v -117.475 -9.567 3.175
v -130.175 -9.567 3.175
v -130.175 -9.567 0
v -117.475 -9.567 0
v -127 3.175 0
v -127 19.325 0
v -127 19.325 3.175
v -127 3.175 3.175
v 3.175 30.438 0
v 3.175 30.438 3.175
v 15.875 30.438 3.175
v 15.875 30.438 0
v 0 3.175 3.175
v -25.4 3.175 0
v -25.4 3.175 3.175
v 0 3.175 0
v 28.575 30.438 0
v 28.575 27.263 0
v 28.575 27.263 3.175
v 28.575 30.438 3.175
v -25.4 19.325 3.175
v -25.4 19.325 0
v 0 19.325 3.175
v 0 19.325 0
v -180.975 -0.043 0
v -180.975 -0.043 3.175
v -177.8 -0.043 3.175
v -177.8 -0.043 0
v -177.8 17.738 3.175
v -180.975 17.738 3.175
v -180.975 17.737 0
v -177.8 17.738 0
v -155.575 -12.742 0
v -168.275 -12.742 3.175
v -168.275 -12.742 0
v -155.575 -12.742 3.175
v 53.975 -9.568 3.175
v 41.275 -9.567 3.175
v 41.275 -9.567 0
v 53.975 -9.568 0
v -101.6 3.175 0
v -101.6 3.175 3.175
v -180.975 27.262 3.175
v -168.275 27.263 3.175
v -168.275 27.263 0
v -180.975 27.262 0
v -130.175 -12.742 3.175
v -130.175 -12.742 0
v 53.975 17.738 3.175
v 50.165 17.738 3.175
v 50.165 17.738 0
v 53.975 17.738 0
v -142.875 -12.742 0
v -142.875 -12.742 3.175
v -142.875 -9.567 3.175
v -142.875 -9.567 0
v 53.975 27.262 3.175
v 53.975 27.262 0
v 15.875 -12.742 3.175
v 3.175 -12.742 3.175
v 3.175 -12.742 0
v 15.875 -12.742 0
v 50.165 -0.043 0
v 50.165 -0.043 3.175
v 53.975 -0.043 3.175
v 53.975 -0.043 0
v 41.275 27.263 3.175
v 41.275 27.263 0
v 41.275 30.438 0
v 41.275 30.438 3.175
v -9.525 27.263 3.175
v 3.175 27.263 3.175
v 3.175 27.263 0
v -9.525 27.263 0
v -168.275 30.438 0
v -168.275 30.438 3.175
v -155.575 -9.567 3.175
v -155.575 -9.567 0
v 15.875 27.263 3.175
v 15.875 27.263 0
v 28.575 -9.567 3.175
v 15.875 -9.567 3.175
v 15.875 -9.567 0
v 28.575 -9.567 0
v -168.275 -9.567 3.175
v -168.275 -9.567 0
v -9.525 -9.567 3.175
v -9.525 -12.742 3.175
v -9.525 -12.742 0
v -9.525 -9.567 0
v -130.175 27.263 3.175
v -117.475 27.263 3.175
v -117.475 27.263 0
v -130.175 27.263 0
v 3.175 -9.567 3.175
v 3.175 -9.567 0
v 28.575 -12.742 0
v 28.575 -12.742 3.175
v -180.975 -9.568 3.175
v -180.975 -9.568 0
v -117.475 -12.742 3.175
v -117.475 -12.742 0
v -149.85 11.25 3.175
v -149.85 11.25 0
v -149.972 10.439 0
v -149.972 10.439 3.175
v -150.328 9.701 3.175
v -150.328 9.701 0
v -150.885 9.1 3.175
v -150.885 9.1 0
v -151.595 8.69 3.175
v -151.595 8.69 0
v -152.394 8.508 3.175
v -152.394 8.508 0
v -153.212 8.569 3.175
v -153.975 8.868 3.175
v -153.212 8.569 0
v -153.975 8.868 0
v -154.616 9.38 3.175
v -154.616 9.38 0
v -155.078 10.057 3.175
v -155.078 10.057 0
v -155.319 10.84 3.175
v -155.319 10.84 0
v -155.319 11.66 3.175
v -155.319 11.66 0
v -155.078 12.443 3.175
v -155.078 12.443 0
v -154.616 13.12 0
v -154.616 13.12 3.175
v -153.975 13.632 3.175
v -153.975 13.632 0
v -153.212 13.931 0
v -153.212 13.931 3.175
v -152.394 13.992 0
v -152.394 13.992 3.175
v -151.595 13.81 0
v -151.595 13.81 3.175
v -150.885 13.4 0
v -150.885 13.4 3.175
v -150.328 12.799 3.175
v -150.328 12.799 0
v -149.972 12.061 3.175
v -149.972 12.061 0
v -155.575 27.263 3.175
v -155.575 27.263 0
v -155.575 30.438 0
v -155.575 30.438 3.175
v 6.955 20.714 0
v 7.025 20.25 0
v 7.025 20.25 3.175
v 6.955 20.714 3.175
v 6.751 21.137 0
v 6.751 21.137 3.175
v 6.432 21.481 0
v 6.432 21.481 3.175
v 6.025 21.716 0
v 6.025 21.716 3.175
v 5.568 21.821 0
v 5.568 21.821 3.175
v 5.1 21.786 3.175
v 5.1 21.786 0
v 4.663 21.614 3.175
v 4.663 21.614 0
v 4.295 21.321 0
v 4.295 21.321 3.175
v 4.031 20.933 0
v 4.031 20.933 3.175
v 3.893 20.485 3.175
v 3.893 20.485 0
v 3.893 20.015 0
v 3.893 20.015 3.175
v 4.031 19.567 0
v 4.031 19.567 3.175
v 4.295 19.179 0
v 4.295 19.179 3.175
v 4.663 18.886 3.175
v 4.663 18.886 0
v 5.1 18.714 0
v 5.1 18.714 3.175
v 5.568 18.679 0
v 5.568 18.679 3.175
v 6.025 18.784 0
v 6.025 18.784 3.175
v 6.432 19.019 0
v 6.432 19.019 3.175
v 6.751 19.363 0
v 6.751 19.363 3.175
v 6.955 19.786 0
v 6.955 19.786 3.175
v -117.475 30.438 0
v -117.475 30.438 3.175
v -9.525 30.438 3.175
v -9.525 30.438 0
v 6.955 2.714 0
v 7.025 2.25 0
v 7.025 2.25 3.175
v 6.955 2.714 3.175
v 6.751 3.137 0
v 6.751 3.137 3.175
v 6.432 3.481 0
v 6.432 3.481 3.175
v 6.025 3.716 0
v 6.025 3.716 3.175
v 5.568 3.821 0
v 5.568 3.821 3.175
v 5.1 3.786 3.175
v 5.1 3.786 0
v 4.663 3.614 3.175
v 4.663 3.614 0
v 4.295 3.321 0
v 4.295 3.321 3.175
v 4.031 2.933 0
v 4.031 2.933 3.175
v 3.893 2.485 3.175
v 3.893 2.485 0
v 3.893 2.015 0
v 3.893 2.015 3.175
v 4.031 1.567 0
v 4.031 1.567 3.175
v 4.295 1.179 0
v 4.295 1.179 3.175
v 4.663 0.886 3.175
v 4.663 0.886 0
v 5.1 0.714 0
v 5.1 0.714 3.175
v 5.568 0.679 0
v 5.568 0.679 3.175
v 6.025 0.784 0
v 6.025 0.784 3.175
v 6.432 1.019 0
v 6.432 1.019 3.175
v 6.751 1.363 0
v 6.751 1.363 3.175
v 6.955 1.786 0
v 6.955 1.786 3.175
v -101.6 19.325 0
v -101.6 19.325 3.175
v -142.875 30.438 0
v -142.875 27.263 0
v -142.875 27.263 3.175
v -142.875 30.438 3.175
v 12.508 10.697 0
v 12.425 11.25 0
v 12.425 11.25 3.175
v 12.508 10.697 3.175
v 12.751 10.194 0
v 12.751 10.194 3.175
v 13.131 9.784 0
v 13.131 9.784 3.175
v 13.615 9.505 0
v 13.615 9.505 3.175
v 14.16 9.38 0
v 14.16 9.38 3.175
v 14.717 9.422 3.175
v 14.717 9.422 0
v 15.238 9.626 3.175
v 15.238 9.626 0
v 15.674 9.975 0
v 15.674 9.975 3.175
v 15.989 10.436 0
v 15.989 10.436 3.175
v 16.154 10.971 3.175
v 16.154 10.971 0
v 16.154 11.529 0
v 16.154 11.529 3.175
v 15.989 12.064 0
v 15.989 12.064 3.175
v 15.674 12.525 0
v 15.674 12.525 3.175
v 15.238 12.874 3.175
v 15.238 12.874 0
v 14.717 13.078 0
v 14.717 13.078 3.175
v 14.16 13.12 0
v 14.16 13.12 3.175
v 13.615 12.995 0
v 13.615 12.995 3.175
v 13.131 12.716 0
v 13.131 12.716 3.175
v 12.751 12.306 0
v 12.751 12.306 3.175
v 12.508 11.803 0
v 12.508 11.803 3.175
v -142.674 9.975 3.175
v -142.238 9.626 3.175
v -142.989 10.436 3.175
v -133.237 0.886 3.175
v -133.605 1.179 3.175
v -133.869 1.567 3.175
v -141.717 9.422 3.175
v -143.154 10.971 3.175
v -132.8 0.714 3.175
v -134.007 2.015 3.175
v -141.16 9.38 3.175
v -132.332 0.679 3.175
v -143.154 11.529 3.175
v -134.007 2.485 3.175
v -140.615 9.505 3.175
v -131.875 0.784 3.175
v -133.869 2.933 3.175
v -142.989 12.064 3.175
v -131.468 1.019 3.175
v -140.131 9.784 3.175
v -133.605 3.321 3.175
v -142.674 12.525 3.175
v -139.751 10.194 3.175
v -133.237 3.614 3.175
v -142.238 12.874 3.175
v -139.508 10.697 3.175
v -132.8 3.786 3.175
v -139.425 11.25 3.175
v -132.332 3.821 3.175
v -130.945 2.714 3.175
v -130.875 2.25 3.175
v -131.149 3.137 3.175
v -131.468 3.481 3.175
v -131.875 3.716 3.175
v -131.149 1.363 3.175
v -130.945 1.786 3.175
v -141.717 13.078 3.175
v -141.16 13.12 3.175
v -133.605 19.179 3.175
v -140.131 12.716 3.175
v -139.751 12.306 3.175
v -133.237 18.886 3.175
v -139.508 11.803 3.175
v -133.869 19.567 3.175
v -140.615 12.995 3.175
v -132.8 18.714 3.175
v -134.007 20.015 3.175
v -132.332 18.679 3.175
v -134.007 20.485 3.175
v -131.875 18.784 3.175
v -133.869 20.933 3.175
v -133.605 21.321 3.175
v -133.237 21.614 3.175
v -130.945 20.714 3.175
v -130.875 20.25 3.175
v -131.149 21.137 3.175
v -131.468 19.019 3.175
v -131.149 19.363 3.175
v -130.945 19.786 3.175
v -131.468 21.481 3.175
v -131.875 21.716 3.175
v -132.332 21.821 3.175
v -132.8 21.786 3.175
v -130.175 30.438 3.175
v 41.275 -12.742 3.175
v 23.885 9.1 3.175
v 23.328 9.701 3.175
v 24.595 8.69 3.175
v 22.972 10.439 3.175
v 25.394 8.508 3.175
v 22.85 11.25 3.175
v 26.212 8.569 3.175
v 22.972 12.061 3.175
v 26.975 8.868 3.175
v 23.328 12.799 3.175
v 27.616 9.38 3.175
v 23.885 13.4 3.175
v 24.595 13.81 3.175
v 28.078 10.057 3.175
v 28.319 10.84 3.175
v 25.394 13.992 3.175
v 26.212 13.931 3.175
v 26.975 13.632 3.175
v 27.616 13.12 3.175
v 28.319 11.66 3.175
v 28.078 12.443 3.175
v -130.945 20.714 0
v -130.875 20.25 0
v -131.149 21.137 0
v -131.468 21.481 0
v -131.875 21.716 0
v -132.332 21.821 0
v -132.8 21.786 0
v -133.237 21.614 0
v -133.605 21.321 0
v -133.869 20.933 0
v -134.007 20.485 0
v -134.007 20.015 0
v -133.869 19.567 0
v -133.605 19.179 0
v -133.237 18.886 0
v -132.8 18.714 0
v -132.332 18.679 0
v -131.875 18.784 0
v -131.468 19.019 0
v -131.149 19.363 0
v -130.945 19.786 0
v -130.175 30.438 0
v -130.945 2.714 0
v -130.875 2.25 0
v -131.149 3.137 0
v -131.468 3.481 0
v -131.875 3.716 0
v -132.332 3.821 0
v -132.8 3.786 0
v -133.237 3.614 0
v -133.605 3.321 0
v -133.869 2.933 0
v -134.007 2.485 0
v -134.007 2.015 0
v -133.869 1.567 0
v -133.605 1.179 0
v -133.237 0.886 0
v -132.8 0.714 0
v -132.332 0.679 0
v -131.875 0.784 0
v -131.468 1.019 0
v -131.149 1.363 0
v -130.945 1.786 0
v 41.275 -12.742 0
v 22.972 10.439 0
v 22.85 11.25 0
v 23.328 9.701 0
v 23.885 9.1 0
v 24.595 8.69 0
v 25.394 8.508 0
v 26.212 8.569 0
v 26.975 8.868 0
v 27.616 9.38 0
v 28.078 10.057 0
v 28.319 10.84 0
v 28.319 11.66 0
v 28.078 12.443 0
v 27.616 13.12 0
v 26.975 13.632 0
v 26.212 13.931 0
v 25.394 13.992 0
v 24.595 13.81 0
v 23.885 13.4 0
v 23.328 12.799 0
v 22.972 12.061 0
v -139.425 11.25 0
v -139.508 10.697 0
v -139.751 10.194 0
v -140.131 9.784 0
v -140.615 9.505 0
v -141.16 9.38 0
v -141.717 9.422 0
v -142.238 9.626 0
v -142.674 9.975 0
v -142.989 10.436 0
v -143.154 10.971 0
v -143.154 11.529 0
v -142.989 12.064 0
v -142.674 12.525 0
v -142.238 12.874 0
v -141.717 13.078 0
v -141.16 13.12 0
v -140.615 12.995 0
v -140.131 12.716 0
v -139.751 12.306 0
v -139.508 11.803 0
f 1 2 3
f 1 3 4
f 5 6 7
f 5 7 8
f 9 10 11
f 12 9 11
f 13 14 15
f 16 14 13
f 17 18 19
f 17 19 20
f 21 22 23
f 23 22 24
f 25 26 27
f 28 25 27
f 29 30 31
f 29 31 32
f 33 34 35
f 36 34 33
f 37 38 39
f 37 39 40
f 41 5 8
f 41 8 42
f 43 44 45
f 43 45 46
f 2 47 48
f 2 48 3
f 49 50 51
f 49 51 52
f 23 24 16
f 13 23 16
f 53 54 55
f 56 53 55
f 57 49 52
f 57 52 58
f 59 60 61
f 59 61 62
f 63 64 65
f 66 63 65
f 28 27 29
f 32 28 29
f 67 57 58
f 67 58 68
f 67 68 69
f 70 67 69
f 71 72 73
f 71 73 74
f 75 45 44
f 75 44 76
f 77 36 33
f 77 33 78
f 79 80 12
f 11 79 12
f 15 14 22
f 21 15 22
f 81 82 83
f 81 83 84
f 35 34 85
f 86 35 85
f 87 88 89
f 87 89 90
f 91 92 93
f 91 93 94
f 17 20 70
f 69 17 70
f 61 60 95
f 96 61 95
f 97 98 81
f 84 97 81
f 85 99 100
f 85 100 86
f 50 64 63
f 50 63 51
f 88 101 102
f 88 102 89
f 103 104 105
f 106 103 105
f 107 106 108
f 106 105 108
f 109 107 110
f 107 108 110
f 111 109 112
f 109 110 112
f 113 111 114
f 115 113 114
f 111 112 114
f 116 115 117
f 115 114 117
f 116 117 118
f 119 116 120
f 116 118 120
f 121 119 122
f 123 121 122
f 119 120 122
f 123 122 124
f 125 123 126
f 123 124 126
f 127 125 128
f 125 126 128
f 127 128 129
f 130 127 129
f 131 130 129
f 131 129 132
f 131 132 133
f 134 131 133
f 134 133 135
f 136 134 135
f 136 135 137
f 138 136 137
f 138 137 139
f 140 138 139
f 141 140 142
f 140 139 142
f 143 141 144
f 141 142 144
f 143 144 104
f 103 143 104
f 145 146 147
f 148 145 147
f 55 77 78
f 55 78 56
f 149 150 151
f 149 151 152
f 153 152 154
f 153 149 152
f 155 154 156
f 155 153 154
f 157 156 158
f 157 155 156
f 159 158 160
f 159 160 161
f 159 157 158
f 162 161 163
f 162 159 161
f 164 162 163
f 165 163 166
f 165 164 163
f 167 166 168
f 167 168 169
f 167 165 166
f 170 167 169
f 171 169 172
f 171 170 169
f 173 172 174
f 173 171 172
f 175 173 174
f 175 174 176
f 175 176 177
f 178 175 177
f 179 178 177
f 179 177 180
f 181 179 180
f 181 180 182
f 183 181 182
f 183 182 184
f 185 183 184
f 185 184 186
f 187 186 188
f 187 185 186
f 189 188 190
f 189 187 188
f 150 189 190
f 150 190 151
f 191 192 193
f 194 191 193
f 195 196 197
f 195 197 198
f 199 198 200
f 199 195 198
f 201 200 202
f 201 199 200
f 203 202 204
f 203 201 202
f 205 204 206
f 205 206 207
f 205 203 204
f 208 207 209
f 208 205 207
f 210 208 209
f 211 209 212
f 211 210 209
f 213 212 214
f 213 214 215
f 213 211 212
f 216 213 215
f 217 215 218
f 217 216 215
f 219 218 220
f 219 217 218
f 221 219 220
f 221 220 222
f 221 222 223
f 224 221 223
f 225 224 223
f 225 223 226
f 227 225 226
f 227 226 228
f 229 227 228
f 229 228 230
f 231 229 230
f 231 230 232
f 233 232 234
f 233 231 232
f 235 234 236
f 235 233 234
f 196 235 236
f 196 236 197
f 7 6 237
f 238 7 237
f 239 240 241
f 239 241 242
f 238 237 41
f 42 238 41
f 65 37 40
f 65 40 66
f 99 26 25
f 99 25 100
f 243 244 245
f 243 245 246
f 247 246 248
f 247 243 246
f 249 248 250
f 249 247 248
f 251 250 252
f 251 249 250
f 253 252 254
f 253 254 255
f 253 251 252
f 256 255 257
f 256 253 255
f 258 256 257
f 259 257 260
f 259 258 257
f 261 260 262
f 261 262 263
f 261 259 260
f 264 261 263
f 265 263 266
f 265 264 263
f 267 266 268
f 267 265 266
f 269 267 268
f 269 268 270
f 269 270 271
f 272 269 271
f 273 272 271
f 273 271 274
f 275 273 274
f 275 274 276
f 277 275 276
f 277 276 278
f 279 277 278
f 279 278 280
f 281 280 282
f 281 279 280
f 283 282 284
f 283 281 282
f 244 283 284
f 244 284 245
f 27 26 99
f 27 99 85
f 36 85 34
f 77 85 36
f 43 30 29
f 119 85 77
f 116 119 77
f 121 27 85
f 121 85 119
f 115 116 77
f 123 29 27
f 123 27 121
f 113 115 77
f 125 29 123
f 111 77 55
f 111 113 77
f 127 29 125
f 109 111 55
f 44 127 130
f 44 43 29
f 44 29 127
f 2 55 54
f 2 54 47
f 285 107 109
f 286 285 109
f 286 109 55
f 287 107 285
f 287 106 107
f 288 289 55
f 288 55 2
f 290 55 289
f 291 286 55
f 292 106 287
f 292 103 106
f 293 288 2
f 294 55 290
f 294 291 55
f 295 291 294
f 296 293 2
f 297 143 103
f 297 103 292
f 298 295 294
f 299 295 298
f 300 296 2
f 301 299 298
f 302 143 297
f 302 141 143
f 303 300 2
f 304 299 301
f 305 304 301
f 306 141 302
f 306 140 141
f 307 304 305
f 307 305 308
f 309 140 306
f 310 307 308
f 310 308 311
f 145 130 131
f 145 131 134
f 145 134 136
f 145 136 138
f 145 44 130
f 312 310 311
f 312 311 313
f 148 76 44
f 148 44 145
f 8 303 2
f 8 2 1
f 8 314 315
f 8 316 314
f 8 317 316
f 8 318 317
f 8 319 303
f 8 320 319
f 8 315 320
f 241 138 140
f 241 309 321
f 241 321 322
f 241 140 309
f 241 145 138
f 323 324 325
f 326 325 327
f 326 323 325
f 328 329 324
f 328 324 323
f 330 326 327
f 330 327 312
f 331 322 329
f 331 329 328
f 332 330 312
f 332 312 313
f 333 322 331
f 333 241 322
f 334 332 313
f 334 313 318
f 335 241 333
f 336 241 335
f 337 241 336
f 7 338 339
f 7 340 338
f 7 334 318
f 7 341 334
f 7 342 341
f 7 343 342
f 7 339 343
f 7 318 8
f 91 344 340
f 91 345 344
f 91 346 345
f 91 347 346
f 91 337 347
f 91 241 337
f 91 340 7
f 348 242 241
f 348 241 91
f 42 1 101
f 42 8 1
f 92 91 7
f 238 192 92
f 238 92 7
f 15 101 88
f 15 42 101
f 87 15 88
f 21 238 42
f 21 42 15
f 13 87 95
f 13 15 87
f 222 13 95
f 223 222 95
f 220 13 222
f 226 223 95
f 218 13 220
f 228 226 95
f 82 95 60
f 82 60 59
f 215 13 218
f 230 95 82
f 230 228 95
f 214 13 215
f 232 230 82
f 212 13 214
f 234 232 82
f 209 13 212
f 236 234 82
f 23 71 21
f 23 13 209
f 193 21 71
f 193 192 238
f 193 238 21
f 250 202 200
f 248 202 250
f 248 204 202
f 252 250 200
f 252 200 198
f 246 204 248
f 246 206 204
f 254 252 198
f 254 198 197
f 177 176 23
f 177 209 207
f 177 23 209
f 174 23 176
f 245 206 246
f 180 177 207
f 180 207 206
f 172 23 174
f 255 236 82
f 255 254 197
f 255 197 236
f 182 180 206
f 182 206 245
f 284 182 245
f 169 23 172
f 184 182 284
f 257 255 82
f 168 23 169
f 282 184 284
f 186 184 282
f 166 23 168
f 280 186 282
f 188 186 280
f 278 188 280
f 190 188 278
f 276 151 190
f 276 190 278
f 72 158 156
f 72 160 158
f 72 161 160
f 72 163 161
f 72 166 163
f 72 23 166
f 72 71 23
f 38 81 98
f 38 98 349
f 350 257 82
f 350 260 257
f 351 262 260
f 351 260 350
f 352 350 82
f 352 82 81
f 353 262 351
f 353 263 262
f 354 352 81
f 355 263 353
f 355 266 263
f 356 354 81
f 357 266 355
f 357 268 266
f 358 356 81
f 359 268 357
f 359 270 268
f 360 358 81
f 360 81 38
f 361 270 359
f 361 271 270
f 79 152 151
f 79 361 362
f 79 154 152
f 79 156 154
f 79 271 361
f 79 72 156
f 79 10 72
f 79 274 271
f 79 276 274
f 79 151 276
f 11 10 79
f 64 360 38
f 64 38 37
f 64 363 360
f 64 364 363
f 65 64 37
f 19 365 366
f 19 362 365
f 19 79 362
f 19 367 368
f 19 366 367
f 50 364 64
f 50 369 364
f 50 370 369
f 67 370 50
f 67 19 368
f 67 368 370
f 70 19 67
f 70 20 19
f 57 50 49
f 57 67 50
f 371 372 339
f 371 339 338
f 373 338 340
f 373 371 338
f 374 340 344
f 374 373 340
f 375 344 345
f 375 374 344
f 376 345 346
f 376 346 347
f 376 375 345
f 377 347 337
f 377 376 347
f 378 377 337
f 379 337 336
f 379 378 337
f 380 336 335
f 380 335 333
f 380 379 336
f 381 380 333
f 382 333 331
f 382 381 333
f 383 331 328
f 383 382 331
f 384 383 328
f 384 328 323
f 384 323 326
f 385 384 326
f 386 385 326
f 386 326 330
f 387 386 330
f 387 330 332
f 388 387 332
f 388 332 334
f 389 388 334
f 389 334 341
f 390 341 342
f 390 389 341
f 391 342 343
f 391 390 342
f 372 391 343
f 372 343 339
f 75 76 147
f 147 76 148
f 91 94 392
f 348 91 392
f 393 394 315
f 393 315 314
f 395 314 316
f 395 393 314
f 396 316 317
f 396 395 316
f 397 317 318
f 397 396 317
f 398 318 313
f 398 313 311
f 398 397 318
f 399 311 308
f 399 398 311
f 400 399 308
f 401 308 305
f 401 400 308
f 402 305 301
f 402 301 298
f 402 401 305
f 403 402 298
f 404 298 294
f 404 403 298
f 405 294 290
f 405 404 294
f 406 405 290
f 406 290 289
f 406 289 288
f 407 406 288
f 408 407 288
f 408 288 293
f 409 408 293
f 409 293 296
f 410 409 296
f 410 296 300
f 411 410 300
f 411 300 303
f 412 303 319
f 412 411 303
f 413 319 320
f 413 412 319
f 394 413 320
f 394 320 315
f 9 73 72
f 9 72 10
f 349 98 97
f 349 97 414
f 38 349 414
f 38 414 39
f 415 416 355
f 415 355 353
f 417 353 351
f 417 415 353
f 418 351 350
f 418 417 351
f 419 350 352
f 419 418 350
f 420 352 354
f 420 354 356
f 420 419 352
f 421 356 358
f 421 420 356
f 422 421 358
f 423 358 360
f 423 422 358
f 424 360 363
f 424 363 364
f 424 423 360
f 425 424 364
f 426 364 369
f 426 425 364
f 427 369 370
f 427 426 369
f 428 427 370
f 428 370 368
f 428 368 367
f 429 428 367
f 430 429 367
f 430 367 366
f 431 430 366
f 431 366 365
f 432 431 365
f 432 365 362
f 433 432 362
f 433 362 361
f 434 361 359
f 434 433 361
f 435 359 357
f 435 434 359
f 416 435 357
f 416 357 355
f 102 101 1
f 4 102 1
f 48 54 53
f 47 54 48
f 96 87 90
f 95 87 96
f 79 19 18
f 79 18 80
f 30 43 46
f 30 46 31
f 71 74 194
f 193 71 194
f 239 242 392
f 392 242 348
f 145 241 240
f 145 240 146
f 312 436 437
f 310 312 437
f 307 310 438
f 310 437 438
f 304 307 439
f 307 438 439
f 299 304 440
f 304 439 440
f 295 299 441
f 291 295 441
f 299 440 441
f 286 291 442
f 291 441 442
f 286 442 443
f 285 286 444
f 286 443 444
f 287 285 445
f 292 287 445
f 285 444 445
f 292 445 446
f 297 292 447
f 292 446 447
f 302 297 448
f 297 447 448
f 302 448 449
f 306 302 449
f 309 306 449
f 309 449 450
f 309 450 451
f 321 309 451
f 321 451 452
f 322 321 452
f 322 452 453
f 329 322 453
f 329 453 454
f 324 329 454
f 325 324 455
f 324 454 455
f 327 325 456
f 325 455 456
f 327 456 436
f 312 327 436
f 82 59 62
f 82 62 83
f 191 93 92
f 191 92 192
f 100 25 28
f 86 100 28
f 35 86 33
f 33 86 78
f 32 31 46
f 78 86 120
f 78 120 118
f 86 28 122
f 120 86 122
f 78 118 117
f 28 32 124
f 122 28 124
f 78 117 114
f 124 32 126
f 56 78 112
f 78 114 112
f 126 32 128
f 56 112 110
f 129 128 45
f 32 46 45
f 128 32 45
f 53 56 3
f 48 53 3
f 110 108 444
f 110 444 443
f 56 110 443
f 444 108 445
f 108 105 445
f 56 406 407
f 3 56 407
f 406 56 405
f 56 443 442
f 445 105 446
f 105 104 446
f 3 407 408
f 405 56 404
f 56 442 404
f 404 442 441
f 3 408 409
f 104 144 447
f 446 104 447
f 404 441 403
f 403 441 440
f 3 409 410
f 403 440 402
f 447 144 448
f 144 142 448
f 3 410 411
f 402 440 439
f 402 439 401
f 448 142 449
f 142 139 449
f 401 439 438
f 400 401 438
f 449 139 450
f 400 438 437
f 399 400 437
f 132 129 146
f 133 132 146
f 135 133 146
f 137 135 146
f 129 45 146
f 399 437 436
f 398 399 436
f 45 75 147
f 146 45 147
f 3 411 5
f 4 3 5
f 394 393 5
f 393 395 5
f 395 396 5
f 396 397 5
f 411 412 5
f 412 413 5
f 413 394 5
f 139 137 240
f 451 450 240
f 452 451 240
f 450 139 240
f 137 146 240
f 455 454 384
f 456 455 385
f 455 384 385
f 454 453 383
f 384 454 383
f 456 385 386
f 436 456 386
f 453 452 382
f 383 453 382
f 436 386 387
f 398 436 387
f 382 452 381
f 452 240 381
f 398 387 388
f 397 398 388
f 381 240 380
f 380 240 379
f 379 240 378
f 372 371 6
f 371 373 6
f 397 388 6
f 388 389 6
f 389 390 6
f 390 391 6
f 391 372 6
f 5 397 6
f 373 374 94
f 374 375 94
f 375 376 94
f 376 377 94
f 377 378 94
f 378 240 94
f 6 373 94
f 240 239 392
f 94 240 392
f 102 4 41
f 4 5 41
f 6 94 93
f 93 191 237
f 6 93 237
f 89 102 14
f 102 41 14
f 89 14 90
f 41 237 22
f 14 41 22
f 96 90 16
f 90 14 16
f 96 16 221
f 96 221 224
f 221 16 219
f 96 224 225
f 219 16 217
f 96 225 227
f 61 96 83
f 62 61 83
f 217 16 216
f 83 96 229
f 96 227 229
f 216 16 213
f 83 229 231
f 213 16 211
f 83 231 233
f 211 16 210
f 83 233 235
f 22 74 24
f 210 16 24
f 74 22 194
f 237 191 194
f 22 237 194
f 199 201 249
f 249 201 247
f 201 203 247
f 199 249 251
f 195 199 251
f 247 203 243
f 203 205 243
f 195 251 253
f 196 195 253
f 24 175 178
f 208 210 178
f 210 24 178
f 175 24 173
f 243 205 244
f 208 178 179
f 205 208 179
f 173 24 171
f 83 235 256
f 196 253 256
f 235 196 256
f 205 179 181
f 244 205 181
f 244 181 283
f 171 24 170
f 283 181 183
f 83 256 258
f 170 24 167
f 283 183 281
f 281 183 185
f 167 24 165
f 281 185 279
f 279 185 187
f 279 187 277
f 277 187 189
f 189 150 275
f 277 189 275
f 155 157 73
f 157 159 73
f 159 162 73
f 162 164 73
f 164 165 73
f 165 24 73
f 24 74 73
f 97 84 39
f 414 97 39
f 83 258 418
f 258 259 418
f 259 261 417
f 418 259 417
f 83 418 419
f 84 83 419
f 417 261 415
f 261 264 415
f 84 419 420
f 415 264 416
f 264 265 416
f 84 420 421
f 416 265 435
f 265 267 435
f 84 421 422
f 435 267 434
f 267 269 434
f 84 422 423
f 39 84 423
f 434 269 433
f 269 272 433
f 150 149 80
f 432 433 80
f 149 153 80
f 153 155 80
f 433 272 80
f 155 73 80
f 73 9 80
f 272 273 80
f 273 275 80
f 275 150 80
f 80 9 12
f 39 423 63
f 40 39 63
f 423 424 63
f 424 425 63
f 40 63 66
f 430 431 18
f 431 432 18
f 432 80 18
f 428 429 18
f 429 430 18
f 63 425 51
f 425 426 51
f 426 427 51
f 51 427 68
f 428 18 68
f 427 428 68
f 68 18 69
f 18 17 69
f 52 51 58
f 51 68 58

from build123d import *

# Parameters (mm, degrees)
SKETCH3_W           = 234.95
SKETCH3_H           = 30.48
SKETCH3_R           = 1.574999898
SKETCH3_W_2         = 25.4
SKETCH3_H_2         = 3.175
BOSS_EXTRUDE1_DEPTH = 3.175
SKETCH4_W           = 107.95
SKETCH4_H           = 3.175
SKETCH4_W_2         = 12.7
BOSS_EXTRUDE2_DEPTH = 3.175
SKETCH5_W           = 3.175
SKETCH5_H           = 17.78
SKETCH5_W_2         = 3.81
CUT_EXTRUDE1_DEPTH  = 7.62


with BuildPart() as part:
    # Sketch3 → Boss-Extrude1 (new body)
    # profile 1 of 7: a face of its own
    with BuildSketch(Plane.XY):
        with Locations((-63.5, 8.8475)):
            Rectangle(SKETCH3_W, SKETCH3_H)
        with BuildLine():
            ThreePointArc((-163.6, 17.5), (-162.135533906, 21.035533906), (-158.6, 22.5))
            Line((-158.6, 22.5), (-127, 22.5))
            Line((-127, 22.5), (-101.6, 22.5))
            Line((-101.6, 22.5), (-101.6, 19.325))
            Line((-101.6, 19.325), (-101.6, 3.175))
            Line((-101.6, 3.175), (-101.6, 0))
            Line((-101.6, 0), (-127, 0))
            Line((-127, 0), (-158.6, 0))
            ThreePointArc((-158.6, 0), (-162.135533906, 1.464466094), (-163.6, 5))
            Line((-163.6, 5), (-163.6, 17.5))
        make_face(mode=Mode.SUBTRACT)
        with BuildLine():
            Line((-25.4, 22.5), (0, 22.5))
            Line((0, 22.5), (31.6, 22.5))
            ThreePointArc((31.6, 22.5), (35.135533906, 21.035533906), (36.6, 17.5))
            Line((36.6, 17.5), (36.6, 5))
            ThreePointArc((36.6, 5), (35.135533906, 1.464466094), (31.6, 0))
            Line((31.6, 0), (0, 0))
            Line((0, 0), (-25.4, 0))
            Line((-25.4, 0), (-25.4, 3.175))
            Line((-25.4, 3.175), (-25.4, 19.325))
            Line((-25.4, 19.325), (-25.4, 22.5))
        make_face(mode=Mode.SUBTRACT)
    # profile 2 of 7: a face of its own
    with BuildSketch(Plane.XY):
        with BuildLine():
            ThreePointArc((-158.6, 0), (-162.135533906, 1.464466094), (-163.6, 5))
            Line((-163.6, 5), (-163.6, 17.5))
            ThreePointArc((-163.6, 17.5), (-162.135533906, 21.035533906), (-158.6, 22.5))
            Line((-158.6, 22.5), (-127, 22.5))
            Line((-127, 22.5), (-127, 0))
            Line((-127, 0), (-158.6, 0))
        make_face()
        with Locations((-132.45, 20.25)):
            Circle(SKETCH3_R, mode=Mode.SUBTRACT)
        with Locations((-132.45, 2.250000072)):
            Circle(SKETCH3_R, mode=Mode.SUBTRACT)
        with BuildLine():
            ThreePointArc((-143.175, 11.25), (-141.3, 13.125), (-139.425, 11.25))
            ThreePointArc((-139.425, 11.25), (-141.3, 9.375), (-143.175, 11.25))
        make_face(mode=Mode.SUBTRACT)
        with BuildLine():
            ThreePointArc((-155.35, 11.25), (-152.6, 14), (-149.85, 11.25))
            ThreePointArc((-149.85, 11.25), (-152.6, 8.5), (-155.35, 11.25))
        make_face(mode=Mode.SUBTRACT)
    # profile 3 of 7: a face of its own
    with BuildSketch(Plane.XY):
        with BuildLine():
            Line((36.6, 5), (36.6, 17.5))
            ThreePointArc((36.6, 17.5), (35.135533906, 21.035533906), (31.6, 22.5))
            Line((31.6, 22.5), (0, 22.5))
            Line((0, 22.5), (0, 0))
            Line((0, 0), (31.6, 0))
            ThreePointArc((31.6, 0), (35.135533906, 1.464466094), (36.6, 5))
        make_face()
        with Locations((5.45, 2.250000072)):
            Circle(SKETCH3_R, mode=Mode.SUBTRACT)
        with Locations((5.45, 20.25)):
            Circle(SKETCH3_R, mode=Mode.SUBTRACT)
        with BuildLine():
            ThreePointArc((16.175, 11.25), (14.3, 13.125), (12.425, 11.25))
            ThreePointArc((12.425, 11.25), (14.3, 9.375), (16.175, 11.25))
        make_face(mode=Mode.SUBTRACT)
        with BuildLine():
            ThreePointArc((28.35, 11.25), (25.6, 14), (22.85, 11.25))
            ThreePointArc((22.85, 11.25), (25.6, 8.5), (28.35, 11.25))
        make_face(mode=Mode.SUBTRACT)
    # profile 4 of 7: a face of its own
    with BuildSketch(Plane.XY):
        with Locations((-12.7, 1.5875)):
            Rectangle(SKETCH3_W_2, SKETCH3_H_2)
    # profile 5 of 7: a face of its own
    with BuildSketch(Plane.XY):
        with Locations((-12.7, 20.9125)):
            Rectangle(SKETCH3_W_2, SKETCH3_H_2)
    # profile 6 of 7: a face of its own
    with BuildSketch(Plane.XY):
        with Locations((-114.3, 20.9125)):
            Rectangle(SKETCH3_W_2, SKETCH3_H_2)
    # profile 7 of 7: a face of its own
    with BuildSketch(Plane.XY):
        with Locations((-114.3, 1.5875)):
            Rectangle(SKETCH3_W_2, SKETCH3_H_2)
    extrude(amount=BOSS_EXTRUDE1_DEPTH)

    # Sketch4 → Boss-Extrude2 (add)
    with BuildSketch(Plane.XY.offset(3.175)):
        with Locations((-63.5, 28.85)):
            Rectangle(SKETCH4_W, SKETCH4_H)
        with Locations((-136.525, 28.85)):
            Rectangle(SKETCH4_W_2, SKETCH4_H)
        with Locations((-161.925, 28.85)):
            Rectangle(SKETCH4_W_2, SKETCH4_H)
        Polygon((-142.875, 27.2625), (-155.575, 27.2625), (-168.275, 27.2625), (-180.975, 27.2625), (-180.975, 24.0875), (53.975, 24.0875), (53.975, 27.2625), (41.275, 27.2625), (28.575, 27.2625), (15.875, 27.2625), (3.175, 27.2625), (-9.525, 27.2625), (-117.475, 27.2625), (-130.175, 27.2625), align=None)
        with Locations((9.525, 28.85)):
            Rectangle(SKETCH4_W_2, SKETCH4_H)
        with Locations((34.925, 28.85)):
            Rectangle(SKETCH4_W_2, SKETCH4_H)
        Polygon((53.975, -6.3925), (-180.975, -6.3925), (-180.975, -9.5675), (-168.275, -9.5675), (-155.575, -9.5675), (-142.875, -9.5675), (-130.175, -9.5675), (-117.475, -9.5675), (-9.525, -9.5675), (3.175, -9.5675), (15.875, -9.5675), (28.575, -9.5675), (41.275, -9.5675), (53.975, -9.5675), align=None)
        with Locations((34.925, -11.155)):
            Rectangle(SKETCH4_W_2, SKETCH4_H)
        with Locations((9.525, -11.155)):
            Rectangle(SKETCH4_W_2, SKETCH4_H)
        with Locations((-63.5, -11.155)):
            Rectangle(SKETCH4_W, SKETCH4_H)
        with Locations((-136.525, -11.155)):
            Rectangle(SKETCH4_W_2, SKETCH4_H)
        with Locations((-161.925, -11.155)):
            Rectangle(SKETCH4_W_2, SKETCH4_H)
    extrude(amount=-BOSS_EXTRUDE2_DEPTH)

    # Sketch5 → Cut-Extrude1 (cut)
    with BuildSketch(Plane.XY.offset(3.175)):
        with Locations((-179.3875, 8.8475)):
            Rectangle(SKETCH5_W, SKETCH5_H)
        with Locations((52.07, 8.8475)):
            Rectangle(SKETCH5_W_2, SKETCH5_H)
    extrude(amount=-CUT_EXTRUDE1_DEPTH, mode=Mode.SUBTRACT)


solid = part.part
